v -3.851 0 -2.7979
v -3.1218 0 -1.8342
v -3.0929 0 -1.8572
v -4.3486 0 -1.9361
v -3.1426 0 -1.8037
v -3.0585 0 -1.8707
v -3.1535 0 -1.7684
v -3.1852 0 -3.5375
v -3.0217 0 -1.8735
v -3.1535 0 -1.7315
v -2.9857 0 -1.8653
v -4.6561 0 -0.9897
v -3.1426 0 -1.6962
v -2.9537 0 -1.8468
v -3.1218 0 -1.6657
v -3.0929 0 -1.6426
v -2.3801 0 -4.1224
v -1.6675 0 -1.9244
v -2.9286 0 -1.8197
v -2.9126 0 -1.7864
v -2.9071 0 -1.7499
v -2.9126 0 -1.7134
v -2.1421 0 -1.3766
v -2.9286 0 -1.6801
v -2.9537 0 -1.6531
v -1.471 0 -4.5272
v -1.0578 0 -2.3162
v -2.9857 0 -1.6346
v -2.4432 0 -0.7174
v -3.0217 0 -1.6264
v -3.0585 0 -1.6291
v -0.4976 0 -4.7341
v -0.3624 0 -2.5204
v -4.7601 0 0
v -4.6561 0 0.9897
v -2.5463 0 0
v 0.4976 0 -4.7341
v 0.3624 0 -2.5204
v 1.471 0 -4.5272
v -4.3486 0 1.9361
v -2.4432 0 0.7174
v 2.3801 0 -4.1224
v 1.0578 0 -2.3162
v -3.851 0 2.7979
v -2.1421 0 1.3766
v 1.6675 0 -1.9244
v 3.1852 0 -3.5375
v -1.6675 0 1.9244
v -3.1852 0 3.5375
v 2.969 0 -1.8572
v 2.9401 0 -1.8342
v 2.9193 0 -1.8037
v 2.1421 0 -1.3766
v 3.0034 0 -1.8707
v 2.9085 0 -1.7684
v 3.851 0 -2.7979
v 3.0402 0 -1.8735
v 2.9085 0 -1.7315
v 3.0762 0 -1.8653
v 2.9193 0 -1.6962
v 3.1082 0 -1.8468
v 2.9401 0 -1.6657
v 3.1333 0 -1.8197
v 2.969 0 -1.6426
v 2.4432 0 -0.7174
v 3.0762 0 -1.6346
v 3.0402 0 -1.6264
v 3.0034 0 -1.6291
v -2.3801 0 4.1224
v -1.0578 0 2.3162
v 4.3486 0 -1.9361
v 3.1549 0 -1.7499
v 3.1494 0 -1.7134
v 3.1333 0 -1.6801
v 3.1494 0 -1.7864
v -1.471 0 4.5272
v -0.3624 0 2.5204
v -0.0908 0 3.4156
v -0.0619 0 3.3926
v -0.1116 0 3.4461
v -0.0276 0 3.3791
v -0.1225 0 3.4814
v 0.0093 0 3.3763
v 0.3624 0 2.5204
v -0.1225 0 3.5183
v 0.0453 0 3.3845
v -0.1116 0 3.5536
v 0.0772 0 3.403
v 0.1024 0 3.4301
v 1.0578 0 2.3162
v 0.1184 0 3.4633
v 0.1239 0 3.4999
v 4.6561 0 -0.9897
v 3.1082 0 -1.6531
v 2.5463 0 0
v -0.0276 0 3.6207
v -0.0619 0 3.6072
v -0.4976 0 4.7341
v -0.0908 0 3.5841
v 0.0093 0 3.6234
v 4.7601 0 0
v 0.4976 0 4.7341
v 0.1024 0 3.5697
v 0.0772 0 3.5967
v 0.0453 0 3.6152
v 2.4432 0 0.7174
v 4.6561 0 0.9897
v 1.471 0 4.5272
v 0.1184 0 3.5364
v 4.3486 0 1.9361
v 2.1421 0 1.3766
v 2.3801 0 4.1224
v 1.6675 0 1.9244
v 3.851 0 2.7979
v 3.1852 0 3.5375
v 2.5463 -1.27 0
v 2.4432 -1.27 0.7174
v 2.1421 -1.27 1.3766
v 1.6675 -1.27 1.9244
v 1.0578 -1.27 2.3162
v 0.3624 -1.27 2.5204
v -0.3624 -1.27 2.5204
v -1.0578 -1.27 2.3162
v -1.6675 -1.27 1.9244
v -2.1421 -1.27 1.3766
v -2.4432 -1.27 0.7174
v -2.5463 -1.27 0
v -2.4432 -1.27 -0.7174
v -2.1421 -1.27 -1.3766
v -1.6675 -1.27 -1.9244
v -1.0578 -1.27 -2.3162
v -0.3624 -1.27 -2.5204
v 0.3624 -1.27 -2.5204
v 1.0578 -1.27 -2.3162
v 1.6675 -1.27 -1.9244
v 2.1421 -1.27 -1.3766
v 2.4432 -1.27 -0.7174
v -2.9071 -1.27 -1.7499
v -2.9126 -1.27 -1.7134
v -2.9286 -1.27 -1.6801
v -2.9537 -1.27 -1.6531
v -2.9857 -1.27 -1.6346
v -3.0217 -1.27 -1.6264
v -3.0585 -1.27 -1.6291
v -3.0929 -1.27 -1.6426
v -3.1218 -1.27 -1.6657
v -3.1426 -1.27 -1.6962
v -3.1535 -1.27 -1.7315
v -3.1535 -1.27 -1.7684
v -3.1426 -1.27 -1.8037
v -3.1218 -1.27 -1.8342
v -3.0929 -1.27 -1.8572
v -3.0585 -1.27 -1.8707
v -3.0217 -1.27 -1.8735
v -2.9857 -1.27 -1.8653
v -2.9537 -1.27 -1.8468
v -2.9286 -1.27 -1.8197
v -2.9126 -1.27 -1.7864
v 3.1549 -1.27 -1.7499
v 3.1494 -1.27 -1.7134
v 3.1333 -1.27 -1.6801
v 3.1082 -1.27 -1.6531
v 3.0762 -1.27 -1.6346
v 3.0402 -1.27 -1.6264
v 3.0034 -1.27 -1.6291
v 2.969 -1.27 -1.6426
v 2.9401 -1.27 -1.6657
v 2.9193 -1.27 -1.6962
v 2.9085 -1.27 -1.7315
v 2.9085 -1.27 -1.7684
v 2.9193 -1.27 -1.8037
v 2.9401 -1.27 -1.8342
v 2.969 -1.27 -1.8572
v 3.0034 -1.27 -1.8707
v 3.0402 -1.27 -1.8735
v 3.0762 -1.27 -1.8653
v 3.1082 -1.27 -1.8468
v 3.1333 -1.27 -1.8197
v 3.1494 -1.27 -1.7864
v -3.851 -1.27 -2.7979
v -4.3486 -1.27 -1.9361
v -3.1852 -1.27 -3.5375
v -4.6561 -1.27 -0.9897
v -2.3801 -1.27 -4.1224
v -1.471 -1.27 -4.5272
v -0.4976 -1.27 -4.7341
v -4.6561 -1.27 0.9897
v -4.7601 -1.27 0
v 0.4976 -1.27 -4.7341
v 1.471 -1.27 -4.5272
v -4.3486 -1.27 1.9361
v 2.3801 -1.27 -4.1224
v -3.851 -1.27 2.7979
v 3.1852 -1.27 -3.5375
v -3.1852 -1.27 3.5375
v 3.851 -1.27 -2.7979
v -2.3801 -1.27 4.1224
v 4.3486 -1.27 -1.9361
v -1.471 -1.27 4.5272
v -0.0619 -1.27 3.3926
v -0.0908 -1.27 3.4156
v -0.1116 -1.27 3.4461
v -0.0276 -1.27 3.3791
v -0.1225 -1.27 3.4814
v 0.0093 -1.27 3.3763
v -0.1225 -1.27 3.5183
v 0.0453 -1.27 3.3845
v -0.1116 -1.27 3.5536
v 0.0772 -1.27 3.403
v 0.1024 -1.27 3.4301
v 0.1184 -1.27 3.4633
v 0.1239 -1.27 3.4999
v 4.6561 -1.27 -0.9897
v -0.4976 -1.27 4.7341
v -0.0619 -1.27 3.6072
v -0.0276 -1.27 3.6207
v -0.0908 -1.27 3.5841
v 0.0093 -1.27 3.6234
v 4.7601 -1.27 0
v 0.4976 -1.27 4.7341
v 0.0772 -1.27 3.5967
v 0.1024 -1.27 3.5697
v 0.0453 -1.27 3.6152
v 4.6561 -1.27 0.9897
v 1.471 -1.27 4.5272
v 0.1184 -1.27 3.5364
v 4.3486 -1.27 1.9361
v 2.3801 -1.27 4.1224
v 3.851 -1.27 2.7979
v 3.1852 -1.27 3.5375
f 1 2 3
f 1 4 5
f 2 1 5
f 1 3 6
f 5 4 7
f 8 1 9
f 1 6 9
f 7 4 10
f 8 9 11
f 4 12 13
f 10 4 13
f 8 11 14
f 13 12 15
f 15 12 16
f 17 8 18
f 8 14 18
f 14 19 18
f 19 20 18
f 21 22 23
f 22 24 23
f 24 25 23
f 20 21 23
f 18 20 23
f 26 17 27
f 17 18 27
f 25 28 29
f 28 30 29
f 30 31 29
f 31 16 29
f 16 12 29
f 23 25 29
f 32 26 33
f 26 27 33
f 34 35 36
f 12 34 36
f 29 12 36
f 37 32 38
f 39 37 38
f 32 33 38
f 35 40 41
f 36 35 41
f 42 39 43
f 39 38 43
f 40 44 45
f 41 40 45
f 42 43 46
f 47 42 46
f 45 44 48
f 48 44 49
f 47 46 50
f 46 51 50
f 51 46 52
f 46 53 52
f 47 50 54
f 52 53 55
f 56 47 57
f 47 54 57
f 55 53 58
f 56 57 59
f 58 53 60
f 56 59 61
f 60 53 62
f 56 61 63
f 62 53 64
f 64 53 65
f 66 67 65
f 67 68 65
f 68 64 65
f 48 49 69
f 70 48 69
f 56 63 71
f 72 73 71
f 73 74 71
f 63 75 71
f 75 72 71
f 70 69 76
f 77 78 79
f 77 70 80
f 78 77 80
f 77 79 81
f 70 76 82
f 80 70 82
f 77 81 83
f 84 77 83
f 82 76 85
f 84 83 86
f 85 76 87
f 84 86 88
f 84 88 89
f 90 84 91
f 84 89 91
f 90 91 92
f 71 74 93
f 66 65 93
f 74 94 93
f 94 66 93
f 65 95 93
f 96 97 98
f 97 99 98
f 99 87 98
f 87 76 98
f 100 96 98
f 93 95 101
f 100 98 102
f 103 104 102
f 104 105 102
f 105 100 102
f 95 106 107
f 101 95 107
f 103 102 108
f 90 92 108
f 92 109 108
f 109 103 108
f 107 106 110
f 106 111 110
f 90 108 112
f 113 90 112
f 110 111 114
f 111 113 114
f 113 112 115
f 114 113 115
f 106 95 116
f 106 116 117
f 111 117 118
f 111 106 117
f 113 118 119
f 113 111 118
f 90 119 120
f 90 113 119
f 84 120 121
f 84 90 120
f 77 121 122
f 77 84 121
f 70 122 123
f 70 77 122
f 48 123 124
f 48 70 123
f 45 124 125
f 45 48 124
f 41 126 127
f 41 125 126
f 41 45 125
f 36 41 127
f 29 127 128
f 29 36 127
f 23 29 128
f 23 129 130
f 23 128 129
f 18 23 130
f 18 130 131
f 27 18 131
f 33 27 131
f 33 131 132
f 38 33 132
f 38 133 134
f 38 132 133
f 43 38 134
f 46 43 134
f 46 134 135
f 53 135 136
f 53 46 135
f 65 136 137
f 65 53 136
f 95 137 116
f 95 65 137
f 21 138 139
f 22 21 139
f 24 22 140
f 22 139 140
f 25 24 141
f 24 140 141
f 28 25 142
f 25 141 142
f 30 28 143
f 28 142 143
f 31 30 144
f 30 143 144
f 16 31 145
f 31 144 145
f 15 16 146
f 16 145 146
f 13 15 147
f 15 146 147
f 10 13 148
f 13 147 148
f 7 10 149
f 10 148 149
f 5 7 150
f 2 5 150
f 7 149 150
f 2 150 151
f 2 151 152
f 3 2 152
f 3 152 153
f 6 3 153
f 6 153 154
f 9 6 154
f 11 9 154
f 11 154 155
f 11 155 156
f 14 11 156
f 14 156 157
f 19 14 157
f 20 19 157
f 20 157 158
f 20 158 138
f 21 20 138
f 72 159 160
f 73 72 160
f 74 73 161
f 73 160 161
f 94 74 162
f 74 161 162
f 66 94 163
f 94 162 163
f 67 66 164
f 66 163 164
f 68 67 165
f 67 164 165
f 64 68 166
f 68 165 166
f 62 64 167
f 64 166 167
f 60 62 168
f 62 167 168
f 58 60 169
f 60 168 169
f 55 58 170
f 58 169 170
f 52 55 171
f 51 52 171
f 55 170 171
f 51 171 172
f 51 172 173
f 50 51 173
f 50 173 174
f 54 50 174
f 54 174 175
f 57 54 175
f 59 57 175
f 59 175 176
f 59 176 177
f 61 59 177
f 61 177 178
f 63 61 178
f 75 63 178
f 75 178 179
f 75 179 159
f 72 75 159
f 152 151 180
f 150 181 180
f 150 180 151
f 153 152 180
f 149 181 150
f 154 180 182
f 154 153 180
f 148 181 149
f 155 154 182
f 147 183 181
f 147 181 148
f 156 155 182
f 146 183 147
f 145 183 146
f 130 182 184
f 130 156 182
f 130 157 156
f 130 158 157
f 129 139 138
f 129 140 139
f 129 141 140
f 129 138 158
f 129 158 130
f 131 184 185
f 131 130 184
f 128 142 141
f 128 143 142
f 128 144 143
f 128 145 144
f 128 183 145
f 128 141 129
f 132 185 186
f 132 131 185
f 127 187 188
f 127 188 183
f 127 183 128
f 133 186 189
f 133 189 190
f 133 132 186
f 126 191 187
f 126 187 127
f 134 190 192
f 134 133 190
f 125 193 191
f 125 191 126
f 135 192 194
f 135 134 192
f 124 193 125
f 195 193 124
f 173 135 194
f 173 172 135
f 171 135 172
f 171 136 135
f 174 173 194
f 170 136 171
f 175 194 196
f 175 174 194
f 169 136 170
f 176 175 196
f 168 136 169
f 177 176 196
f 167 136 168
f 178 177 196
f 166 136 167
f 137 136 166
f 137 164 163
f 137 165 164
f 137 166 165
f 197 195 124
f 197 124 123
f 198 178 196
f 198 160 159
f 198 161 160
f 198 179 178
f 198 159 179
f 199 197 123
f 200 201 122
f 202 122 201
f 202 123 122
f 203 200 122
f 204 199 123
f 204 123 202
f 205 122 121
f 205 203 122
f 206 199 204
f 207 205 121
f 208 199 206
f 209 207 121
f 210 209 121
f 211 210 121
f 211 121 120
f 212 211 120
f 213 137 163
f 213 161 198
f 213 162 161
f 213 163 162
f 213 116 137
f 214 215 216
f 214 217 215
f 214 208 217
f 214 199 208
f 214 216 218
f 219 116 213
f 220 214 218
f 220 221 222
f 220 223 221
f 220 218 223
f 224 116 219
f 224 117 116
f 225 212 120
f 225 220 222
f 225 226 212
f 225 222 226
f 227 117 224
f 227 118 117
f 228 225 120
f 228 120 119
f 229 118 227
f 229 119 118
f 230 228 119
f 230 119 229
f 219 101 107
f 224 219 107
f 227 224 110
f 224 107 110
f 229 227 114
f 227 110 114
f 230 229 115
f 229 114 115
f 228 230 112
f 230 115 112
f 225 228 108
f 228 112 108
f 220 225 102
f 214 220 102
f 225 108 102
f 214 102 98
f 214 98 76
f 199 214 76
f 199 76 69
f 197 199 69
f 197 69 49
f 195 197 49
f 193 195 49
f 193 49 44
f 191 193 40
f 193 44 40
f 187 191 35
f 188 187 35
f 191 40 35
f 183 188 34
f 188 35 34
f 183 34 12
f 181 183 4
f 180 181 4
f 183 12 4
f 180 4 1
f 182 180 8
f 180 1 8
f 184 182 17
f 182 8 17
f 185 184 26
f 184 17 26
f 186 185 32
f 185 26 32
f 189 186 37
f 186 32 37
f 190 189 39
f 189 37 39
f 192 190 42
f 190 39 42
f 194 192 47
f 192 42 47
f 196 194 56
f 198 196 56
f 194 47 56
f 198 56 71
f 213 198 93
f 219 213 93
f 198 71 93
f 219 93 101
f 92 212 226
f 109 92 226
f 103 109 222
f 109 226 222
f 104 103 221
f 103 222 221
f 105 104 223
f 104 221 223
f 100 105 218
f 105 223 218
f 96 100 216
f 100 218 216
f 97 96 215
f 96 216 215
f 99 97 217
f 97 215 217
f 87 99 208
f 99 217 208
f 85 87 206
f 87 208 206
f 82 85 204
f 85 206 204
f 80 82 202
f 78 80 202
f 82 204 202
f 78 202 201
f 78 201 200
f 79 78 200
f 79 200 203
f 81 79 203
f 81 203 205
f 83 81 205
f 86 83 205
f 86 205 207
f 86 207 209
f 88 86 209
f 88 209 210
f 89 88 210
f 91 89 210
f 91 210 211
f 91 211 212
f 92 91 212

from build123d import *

# Parameters (mm, degrees)
F0_R     = 4.760132
F2_DEPTH = 1.27
F1_R     = 2.546317
F3_DEPTH = 12.7
F4_R     = 0.123894
F5_DEPTH = 25.4


with BuildPart() as f2:
    # F0 (on Front) → F2 (new body)
    with BuildSketch(Plane.XZ):
        Circle(F0_R)
    extrude(amount=F2_DEPTH)

    # F1 (on face) → F3 (cut)
    with BuildSketch(Plane.XZ):
        Circle(F1_R)
    extrude(amount=F3_DEPTH, mode=Mode.SUBTRACT)

    # F4 (on face) → F5 (cut)
    with BuildSketch(Plane.XZ.offset(1.27)):
        with Locations((0, 3.499863)):
            Circle(F4_R)
        with Locations((-3.03097, -1.749931)):
            Circle(F4_R)
        with Locations((3.03097, -1.749931)):
            Circle(F4_R)
    extrude(amount=-F5_DEPTH, mode=Mode.SUBTRACT)


solid = f2.part
